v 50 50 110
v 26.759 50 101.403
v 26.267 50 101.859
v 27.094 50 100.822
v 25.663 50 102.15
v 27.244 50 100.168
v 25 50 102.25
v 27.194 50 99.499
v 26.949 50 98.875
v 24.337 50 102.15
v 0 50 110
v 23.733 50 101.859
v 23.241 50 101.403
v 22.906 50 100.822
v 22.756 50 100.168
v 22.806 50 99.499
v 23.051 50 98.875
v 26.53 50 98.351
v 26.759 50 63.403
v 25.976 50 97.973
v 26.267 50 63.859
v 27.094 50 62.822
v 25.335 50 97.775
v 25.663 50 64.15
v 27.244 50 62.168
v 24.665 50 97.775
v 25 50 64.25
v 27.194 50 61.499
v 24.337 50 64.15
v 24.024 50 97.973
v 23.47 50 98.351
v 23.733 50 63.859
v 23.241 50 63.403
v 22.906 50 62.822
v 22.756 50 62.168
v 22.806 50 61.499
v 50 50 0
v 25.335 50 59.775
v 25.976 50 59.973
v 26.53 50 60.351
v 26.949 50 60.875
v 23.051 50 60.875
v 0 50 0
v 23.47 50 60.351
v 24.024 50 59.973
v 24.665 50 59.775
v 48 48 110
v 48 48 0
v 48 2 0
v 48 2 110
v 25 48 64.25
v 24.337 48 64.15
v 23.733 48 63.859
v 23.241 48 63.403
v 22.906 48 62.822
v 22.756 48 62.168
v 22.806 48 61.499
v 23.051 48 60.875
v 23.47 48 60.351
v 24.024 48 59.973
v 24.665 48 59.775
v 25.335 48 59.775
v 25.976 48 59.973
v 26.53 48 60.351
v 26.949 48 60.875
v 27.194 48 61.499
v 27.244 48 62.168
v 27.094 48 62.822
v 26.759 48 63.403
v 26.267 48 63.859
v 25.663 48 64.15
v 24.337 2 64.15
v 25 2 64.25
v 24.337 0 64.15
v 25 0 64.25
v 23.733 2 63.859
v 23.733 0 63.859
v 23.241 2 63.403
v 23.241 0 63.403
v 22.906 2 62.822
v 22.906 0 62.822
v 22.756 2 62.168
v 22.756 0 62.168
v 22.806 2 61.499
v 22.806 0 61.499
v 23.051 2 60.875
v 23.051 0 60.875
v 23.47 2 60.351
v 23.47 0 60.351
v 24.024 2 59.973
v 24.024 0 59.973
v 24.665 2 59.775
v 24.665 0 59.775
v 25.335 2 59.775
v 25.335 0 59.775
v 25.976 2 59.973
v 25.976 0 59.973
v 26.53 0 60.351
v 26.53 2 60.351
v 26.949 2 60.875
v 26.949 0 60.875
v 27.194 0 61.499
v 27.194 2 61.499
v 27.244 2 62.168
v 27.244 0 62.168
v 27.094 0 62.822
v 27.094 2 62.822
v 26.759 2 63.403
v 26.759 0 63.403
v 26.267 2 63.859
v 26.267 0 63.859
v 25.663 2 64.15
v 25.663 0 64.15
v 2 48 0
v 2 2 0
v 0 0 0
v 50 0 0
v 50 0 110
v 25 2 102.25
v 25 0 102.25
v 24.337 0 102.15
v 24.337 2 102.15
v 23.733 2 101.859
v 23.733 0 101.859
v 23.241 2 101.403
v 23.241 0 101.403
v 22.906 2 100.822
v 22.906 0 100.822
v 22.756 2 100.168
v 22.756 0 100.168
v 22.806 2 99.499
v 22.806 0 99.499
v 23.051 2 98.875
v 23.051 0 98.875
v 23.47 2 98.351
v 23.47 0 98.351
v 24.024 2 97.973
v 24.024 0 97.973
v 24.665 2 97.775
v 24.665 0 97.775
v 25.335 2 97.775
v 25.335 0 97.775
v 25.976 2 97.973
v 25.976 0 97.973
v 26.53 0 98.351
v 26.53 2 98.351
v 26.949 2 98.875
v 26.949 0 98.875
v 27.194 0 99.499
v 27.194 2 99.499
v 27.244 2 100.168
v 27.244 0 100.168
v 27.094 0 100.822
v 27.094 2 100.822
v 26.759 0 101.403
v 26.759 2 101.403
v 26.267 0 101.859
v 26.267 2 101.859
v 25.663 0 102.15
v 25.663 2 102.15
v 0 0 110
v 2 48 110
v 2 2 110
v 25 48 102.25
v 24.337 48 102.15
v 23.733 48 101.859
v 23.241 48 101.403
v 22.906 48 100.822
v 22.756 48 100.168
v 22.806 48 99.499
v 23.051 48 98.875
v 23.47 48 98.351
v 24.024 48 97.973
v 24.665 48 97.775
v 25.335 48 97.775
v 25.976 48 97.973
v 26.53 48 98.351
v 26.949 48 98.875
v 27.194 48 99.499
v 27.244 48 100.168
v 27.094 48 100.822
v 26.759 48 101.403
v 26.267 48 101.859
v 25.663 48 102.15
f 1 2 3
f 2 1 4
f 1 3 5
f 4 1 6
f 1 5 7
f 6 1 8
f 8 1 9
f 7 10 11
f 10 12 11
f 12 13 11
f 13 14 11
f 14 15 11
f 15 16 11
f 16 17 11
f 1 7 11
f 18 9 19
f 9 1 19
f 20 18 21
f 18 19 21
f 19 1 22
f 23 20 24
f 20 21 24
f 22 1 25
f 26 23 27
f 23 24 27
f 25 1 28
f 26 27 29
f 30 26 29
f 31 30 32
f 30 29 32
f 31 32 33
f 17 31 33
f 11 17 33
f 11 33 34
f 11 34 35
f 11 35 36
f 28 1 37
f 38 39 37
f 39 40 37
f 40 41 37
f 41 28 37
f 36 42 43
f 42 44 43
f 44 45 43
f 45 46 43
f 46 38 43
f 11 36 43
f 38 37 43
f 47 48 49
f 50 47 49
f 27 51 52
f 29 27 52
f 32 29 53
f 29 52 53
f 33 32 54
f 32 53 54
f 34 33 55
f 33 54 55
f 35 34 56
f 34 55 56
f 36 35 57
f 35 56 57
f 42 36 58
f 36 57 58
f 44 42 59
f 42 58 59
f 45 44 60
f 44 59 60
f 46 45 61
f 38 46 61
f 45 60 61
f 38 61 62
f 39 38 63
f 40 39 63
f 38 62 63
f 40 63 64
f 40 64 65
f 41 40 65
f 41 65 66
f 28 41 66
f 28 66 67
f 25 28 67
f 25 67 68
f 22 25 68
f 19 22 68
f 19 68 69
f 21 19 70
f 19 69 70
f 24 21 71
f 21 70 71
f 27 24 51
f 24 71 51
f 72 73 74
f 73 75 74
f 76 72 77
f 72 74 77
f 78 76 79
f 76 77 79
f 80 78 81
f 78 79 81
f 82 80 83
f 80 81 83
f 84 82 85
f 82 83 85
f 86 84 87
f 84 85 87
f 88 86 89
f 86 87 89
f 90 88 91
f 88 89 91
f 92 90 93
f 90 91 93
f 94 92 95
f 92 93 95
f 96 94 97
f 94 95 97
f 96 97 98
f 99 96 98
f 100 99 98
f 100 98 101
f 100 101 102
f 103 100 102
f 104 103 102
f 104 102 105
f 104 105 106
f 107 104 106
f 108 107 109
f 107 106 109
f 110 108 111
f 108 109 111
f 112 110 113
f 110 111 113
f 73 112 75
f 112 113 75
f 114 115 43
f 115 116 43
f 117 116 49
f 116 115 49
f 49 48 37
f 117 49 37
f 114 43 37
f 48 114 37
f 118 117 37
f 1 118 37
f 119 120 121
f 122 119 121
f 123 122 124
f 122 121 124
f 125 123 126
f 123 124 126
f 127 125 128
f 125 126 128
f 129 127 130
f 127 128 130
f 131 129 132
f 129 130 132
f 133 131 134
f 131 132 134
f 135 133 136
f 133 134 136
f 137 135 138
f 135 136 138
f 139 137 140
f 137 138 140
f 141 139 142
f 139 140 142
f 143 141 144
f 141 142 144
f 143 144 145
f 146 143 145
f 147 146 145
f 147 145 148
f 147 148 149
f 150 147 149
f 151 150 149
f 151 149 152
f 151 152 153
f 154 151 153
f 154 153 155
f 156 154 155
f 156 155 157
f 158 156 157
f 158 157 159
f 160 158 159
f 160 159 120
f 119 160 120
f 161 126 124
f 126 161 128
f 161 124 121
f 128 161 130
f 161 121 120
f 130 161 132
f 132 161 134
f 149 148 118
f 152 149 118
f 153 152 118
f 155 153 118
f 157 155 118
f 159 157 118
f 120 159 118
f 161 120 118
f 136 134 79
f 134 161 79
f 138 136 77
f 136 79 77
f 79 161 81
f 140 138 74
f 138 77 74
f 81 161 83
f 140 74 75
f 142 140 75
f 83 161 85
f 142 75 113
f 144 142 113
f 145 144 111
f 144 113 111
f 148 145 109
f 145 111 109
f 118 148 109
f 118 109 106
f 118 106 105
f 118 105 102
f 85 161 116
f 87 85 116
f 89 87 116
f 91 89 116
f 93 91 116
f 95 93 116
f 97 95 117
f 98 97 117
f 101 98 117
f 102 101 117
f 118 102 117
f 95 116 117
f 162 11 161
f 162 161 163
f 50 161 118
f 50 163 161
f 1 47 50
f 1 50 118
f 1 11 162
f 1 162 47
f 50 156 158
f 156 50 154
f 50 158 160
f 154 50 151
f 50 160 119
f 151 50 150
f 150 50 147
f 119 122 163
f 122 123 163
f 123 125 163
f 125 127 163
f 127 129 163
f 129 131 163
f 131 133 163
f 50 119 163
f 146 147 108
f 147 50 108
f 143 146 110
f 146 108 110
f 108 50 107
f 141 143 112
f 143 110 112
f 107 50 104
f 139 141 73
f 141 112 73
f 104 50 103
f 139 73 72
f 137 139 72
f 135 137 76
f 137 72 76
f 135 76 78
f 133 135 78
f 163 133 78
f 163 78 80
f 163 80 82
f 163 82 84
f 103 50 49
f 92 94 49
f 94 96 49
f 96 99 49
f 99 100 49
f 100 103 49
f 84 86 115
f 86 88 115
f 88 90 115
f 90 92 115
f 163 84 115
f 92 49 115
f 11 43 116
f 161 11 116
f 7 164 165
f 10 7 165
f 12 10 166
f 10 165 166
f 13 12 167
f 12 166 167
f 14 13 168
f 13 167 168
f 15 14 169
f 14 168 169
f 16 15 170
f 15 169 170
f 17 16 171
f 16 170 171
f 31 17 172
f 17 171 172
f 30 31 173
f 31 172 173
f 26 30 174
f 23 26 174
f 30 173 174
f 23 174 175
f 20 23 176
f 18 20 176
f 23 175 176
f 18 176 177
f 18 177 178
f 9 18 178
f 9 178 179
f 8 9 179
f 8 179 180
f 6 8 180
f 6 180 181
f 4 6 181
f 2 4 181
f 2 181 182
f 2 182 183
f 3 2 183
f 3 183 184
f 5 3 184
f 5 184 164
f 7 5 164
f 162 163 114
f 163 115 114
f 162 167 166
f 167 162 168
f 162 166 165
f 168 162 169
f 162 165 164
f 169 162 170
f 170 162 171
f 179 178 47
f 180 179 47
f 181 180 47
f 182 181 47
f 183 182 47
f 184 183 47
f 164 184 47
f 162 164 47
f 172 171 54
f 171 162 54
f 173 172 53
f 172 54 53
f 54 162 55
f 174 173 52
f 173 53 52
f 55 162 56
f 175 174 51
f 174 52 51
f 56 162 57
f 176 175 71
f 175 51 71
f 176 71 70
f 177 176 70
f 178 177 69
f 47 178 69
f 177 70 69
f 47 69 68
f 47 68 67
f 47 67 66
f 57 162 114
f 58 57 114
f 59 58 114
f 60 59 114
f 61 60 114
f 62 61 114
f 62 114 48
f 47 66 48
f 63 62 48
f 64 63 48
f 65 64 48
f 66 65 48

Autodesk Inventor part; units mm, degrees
ref_plane "YZ Plane" through (0, 0, 0) normal (1, 0, 0) x (0, 1, 0)
ref_plane "XZ Plane" through (0, 0, 0) normal (0, 1, 0) x (-1, 0, 0)
ref_plane "XY Plane" through (0, 0, 0) normal (0, 0, 1) x (1, 0, 0)
sketch "スケッチ1" plane through (0, 0, 0) normal (0, 0, 1) x (1, 0, 0)
  line L0 (0, 0) -> (50, 0)
  line L1 (50, 0) -> (50, 50)
  line L2 (50, 50) -> (0, 50)
  line L3 (0, 50) -> (0, 0)
  line L4 (2, 48) -> (48, 48)
  line L5 (48, 48) -> (48, 2)
  line L6 (48, 2) -> (2, 2)
  line L7 (2, 2) -> (2, 48)
  dimension "d0" = 50
  dimension "d1" = 50
  dimension "d2" = 2
extrude "押し出し1" add sketch "スケッチ1" along normal blind 110
sketch "スケッチ5" plane through (0, 50, 0) normal (0, 1, 0) x (1, 0, 0)
  line L0 (50, 0) -> (0, 0) projected
  line L1 (0, 0) -> (0, -110) projected
  line L2 (50, -110) -> (0, -110) projected
  line L3 (50, 0) -> (50, -110) projected
  line L4 (25, 0) -> (25, -110) construction
  point P0 (0, 0)
  point P1 (25, -62)
  point P2 (25, -100)
  dimension "d42" = 38
  dimension "d43" = 10
hole "穴4" at (25, 50, 62) at (25, 50, 100) direction (0, -1, 0) diameter 4.5 end through all
properties part number "center" material "アルミニウム 6061"
